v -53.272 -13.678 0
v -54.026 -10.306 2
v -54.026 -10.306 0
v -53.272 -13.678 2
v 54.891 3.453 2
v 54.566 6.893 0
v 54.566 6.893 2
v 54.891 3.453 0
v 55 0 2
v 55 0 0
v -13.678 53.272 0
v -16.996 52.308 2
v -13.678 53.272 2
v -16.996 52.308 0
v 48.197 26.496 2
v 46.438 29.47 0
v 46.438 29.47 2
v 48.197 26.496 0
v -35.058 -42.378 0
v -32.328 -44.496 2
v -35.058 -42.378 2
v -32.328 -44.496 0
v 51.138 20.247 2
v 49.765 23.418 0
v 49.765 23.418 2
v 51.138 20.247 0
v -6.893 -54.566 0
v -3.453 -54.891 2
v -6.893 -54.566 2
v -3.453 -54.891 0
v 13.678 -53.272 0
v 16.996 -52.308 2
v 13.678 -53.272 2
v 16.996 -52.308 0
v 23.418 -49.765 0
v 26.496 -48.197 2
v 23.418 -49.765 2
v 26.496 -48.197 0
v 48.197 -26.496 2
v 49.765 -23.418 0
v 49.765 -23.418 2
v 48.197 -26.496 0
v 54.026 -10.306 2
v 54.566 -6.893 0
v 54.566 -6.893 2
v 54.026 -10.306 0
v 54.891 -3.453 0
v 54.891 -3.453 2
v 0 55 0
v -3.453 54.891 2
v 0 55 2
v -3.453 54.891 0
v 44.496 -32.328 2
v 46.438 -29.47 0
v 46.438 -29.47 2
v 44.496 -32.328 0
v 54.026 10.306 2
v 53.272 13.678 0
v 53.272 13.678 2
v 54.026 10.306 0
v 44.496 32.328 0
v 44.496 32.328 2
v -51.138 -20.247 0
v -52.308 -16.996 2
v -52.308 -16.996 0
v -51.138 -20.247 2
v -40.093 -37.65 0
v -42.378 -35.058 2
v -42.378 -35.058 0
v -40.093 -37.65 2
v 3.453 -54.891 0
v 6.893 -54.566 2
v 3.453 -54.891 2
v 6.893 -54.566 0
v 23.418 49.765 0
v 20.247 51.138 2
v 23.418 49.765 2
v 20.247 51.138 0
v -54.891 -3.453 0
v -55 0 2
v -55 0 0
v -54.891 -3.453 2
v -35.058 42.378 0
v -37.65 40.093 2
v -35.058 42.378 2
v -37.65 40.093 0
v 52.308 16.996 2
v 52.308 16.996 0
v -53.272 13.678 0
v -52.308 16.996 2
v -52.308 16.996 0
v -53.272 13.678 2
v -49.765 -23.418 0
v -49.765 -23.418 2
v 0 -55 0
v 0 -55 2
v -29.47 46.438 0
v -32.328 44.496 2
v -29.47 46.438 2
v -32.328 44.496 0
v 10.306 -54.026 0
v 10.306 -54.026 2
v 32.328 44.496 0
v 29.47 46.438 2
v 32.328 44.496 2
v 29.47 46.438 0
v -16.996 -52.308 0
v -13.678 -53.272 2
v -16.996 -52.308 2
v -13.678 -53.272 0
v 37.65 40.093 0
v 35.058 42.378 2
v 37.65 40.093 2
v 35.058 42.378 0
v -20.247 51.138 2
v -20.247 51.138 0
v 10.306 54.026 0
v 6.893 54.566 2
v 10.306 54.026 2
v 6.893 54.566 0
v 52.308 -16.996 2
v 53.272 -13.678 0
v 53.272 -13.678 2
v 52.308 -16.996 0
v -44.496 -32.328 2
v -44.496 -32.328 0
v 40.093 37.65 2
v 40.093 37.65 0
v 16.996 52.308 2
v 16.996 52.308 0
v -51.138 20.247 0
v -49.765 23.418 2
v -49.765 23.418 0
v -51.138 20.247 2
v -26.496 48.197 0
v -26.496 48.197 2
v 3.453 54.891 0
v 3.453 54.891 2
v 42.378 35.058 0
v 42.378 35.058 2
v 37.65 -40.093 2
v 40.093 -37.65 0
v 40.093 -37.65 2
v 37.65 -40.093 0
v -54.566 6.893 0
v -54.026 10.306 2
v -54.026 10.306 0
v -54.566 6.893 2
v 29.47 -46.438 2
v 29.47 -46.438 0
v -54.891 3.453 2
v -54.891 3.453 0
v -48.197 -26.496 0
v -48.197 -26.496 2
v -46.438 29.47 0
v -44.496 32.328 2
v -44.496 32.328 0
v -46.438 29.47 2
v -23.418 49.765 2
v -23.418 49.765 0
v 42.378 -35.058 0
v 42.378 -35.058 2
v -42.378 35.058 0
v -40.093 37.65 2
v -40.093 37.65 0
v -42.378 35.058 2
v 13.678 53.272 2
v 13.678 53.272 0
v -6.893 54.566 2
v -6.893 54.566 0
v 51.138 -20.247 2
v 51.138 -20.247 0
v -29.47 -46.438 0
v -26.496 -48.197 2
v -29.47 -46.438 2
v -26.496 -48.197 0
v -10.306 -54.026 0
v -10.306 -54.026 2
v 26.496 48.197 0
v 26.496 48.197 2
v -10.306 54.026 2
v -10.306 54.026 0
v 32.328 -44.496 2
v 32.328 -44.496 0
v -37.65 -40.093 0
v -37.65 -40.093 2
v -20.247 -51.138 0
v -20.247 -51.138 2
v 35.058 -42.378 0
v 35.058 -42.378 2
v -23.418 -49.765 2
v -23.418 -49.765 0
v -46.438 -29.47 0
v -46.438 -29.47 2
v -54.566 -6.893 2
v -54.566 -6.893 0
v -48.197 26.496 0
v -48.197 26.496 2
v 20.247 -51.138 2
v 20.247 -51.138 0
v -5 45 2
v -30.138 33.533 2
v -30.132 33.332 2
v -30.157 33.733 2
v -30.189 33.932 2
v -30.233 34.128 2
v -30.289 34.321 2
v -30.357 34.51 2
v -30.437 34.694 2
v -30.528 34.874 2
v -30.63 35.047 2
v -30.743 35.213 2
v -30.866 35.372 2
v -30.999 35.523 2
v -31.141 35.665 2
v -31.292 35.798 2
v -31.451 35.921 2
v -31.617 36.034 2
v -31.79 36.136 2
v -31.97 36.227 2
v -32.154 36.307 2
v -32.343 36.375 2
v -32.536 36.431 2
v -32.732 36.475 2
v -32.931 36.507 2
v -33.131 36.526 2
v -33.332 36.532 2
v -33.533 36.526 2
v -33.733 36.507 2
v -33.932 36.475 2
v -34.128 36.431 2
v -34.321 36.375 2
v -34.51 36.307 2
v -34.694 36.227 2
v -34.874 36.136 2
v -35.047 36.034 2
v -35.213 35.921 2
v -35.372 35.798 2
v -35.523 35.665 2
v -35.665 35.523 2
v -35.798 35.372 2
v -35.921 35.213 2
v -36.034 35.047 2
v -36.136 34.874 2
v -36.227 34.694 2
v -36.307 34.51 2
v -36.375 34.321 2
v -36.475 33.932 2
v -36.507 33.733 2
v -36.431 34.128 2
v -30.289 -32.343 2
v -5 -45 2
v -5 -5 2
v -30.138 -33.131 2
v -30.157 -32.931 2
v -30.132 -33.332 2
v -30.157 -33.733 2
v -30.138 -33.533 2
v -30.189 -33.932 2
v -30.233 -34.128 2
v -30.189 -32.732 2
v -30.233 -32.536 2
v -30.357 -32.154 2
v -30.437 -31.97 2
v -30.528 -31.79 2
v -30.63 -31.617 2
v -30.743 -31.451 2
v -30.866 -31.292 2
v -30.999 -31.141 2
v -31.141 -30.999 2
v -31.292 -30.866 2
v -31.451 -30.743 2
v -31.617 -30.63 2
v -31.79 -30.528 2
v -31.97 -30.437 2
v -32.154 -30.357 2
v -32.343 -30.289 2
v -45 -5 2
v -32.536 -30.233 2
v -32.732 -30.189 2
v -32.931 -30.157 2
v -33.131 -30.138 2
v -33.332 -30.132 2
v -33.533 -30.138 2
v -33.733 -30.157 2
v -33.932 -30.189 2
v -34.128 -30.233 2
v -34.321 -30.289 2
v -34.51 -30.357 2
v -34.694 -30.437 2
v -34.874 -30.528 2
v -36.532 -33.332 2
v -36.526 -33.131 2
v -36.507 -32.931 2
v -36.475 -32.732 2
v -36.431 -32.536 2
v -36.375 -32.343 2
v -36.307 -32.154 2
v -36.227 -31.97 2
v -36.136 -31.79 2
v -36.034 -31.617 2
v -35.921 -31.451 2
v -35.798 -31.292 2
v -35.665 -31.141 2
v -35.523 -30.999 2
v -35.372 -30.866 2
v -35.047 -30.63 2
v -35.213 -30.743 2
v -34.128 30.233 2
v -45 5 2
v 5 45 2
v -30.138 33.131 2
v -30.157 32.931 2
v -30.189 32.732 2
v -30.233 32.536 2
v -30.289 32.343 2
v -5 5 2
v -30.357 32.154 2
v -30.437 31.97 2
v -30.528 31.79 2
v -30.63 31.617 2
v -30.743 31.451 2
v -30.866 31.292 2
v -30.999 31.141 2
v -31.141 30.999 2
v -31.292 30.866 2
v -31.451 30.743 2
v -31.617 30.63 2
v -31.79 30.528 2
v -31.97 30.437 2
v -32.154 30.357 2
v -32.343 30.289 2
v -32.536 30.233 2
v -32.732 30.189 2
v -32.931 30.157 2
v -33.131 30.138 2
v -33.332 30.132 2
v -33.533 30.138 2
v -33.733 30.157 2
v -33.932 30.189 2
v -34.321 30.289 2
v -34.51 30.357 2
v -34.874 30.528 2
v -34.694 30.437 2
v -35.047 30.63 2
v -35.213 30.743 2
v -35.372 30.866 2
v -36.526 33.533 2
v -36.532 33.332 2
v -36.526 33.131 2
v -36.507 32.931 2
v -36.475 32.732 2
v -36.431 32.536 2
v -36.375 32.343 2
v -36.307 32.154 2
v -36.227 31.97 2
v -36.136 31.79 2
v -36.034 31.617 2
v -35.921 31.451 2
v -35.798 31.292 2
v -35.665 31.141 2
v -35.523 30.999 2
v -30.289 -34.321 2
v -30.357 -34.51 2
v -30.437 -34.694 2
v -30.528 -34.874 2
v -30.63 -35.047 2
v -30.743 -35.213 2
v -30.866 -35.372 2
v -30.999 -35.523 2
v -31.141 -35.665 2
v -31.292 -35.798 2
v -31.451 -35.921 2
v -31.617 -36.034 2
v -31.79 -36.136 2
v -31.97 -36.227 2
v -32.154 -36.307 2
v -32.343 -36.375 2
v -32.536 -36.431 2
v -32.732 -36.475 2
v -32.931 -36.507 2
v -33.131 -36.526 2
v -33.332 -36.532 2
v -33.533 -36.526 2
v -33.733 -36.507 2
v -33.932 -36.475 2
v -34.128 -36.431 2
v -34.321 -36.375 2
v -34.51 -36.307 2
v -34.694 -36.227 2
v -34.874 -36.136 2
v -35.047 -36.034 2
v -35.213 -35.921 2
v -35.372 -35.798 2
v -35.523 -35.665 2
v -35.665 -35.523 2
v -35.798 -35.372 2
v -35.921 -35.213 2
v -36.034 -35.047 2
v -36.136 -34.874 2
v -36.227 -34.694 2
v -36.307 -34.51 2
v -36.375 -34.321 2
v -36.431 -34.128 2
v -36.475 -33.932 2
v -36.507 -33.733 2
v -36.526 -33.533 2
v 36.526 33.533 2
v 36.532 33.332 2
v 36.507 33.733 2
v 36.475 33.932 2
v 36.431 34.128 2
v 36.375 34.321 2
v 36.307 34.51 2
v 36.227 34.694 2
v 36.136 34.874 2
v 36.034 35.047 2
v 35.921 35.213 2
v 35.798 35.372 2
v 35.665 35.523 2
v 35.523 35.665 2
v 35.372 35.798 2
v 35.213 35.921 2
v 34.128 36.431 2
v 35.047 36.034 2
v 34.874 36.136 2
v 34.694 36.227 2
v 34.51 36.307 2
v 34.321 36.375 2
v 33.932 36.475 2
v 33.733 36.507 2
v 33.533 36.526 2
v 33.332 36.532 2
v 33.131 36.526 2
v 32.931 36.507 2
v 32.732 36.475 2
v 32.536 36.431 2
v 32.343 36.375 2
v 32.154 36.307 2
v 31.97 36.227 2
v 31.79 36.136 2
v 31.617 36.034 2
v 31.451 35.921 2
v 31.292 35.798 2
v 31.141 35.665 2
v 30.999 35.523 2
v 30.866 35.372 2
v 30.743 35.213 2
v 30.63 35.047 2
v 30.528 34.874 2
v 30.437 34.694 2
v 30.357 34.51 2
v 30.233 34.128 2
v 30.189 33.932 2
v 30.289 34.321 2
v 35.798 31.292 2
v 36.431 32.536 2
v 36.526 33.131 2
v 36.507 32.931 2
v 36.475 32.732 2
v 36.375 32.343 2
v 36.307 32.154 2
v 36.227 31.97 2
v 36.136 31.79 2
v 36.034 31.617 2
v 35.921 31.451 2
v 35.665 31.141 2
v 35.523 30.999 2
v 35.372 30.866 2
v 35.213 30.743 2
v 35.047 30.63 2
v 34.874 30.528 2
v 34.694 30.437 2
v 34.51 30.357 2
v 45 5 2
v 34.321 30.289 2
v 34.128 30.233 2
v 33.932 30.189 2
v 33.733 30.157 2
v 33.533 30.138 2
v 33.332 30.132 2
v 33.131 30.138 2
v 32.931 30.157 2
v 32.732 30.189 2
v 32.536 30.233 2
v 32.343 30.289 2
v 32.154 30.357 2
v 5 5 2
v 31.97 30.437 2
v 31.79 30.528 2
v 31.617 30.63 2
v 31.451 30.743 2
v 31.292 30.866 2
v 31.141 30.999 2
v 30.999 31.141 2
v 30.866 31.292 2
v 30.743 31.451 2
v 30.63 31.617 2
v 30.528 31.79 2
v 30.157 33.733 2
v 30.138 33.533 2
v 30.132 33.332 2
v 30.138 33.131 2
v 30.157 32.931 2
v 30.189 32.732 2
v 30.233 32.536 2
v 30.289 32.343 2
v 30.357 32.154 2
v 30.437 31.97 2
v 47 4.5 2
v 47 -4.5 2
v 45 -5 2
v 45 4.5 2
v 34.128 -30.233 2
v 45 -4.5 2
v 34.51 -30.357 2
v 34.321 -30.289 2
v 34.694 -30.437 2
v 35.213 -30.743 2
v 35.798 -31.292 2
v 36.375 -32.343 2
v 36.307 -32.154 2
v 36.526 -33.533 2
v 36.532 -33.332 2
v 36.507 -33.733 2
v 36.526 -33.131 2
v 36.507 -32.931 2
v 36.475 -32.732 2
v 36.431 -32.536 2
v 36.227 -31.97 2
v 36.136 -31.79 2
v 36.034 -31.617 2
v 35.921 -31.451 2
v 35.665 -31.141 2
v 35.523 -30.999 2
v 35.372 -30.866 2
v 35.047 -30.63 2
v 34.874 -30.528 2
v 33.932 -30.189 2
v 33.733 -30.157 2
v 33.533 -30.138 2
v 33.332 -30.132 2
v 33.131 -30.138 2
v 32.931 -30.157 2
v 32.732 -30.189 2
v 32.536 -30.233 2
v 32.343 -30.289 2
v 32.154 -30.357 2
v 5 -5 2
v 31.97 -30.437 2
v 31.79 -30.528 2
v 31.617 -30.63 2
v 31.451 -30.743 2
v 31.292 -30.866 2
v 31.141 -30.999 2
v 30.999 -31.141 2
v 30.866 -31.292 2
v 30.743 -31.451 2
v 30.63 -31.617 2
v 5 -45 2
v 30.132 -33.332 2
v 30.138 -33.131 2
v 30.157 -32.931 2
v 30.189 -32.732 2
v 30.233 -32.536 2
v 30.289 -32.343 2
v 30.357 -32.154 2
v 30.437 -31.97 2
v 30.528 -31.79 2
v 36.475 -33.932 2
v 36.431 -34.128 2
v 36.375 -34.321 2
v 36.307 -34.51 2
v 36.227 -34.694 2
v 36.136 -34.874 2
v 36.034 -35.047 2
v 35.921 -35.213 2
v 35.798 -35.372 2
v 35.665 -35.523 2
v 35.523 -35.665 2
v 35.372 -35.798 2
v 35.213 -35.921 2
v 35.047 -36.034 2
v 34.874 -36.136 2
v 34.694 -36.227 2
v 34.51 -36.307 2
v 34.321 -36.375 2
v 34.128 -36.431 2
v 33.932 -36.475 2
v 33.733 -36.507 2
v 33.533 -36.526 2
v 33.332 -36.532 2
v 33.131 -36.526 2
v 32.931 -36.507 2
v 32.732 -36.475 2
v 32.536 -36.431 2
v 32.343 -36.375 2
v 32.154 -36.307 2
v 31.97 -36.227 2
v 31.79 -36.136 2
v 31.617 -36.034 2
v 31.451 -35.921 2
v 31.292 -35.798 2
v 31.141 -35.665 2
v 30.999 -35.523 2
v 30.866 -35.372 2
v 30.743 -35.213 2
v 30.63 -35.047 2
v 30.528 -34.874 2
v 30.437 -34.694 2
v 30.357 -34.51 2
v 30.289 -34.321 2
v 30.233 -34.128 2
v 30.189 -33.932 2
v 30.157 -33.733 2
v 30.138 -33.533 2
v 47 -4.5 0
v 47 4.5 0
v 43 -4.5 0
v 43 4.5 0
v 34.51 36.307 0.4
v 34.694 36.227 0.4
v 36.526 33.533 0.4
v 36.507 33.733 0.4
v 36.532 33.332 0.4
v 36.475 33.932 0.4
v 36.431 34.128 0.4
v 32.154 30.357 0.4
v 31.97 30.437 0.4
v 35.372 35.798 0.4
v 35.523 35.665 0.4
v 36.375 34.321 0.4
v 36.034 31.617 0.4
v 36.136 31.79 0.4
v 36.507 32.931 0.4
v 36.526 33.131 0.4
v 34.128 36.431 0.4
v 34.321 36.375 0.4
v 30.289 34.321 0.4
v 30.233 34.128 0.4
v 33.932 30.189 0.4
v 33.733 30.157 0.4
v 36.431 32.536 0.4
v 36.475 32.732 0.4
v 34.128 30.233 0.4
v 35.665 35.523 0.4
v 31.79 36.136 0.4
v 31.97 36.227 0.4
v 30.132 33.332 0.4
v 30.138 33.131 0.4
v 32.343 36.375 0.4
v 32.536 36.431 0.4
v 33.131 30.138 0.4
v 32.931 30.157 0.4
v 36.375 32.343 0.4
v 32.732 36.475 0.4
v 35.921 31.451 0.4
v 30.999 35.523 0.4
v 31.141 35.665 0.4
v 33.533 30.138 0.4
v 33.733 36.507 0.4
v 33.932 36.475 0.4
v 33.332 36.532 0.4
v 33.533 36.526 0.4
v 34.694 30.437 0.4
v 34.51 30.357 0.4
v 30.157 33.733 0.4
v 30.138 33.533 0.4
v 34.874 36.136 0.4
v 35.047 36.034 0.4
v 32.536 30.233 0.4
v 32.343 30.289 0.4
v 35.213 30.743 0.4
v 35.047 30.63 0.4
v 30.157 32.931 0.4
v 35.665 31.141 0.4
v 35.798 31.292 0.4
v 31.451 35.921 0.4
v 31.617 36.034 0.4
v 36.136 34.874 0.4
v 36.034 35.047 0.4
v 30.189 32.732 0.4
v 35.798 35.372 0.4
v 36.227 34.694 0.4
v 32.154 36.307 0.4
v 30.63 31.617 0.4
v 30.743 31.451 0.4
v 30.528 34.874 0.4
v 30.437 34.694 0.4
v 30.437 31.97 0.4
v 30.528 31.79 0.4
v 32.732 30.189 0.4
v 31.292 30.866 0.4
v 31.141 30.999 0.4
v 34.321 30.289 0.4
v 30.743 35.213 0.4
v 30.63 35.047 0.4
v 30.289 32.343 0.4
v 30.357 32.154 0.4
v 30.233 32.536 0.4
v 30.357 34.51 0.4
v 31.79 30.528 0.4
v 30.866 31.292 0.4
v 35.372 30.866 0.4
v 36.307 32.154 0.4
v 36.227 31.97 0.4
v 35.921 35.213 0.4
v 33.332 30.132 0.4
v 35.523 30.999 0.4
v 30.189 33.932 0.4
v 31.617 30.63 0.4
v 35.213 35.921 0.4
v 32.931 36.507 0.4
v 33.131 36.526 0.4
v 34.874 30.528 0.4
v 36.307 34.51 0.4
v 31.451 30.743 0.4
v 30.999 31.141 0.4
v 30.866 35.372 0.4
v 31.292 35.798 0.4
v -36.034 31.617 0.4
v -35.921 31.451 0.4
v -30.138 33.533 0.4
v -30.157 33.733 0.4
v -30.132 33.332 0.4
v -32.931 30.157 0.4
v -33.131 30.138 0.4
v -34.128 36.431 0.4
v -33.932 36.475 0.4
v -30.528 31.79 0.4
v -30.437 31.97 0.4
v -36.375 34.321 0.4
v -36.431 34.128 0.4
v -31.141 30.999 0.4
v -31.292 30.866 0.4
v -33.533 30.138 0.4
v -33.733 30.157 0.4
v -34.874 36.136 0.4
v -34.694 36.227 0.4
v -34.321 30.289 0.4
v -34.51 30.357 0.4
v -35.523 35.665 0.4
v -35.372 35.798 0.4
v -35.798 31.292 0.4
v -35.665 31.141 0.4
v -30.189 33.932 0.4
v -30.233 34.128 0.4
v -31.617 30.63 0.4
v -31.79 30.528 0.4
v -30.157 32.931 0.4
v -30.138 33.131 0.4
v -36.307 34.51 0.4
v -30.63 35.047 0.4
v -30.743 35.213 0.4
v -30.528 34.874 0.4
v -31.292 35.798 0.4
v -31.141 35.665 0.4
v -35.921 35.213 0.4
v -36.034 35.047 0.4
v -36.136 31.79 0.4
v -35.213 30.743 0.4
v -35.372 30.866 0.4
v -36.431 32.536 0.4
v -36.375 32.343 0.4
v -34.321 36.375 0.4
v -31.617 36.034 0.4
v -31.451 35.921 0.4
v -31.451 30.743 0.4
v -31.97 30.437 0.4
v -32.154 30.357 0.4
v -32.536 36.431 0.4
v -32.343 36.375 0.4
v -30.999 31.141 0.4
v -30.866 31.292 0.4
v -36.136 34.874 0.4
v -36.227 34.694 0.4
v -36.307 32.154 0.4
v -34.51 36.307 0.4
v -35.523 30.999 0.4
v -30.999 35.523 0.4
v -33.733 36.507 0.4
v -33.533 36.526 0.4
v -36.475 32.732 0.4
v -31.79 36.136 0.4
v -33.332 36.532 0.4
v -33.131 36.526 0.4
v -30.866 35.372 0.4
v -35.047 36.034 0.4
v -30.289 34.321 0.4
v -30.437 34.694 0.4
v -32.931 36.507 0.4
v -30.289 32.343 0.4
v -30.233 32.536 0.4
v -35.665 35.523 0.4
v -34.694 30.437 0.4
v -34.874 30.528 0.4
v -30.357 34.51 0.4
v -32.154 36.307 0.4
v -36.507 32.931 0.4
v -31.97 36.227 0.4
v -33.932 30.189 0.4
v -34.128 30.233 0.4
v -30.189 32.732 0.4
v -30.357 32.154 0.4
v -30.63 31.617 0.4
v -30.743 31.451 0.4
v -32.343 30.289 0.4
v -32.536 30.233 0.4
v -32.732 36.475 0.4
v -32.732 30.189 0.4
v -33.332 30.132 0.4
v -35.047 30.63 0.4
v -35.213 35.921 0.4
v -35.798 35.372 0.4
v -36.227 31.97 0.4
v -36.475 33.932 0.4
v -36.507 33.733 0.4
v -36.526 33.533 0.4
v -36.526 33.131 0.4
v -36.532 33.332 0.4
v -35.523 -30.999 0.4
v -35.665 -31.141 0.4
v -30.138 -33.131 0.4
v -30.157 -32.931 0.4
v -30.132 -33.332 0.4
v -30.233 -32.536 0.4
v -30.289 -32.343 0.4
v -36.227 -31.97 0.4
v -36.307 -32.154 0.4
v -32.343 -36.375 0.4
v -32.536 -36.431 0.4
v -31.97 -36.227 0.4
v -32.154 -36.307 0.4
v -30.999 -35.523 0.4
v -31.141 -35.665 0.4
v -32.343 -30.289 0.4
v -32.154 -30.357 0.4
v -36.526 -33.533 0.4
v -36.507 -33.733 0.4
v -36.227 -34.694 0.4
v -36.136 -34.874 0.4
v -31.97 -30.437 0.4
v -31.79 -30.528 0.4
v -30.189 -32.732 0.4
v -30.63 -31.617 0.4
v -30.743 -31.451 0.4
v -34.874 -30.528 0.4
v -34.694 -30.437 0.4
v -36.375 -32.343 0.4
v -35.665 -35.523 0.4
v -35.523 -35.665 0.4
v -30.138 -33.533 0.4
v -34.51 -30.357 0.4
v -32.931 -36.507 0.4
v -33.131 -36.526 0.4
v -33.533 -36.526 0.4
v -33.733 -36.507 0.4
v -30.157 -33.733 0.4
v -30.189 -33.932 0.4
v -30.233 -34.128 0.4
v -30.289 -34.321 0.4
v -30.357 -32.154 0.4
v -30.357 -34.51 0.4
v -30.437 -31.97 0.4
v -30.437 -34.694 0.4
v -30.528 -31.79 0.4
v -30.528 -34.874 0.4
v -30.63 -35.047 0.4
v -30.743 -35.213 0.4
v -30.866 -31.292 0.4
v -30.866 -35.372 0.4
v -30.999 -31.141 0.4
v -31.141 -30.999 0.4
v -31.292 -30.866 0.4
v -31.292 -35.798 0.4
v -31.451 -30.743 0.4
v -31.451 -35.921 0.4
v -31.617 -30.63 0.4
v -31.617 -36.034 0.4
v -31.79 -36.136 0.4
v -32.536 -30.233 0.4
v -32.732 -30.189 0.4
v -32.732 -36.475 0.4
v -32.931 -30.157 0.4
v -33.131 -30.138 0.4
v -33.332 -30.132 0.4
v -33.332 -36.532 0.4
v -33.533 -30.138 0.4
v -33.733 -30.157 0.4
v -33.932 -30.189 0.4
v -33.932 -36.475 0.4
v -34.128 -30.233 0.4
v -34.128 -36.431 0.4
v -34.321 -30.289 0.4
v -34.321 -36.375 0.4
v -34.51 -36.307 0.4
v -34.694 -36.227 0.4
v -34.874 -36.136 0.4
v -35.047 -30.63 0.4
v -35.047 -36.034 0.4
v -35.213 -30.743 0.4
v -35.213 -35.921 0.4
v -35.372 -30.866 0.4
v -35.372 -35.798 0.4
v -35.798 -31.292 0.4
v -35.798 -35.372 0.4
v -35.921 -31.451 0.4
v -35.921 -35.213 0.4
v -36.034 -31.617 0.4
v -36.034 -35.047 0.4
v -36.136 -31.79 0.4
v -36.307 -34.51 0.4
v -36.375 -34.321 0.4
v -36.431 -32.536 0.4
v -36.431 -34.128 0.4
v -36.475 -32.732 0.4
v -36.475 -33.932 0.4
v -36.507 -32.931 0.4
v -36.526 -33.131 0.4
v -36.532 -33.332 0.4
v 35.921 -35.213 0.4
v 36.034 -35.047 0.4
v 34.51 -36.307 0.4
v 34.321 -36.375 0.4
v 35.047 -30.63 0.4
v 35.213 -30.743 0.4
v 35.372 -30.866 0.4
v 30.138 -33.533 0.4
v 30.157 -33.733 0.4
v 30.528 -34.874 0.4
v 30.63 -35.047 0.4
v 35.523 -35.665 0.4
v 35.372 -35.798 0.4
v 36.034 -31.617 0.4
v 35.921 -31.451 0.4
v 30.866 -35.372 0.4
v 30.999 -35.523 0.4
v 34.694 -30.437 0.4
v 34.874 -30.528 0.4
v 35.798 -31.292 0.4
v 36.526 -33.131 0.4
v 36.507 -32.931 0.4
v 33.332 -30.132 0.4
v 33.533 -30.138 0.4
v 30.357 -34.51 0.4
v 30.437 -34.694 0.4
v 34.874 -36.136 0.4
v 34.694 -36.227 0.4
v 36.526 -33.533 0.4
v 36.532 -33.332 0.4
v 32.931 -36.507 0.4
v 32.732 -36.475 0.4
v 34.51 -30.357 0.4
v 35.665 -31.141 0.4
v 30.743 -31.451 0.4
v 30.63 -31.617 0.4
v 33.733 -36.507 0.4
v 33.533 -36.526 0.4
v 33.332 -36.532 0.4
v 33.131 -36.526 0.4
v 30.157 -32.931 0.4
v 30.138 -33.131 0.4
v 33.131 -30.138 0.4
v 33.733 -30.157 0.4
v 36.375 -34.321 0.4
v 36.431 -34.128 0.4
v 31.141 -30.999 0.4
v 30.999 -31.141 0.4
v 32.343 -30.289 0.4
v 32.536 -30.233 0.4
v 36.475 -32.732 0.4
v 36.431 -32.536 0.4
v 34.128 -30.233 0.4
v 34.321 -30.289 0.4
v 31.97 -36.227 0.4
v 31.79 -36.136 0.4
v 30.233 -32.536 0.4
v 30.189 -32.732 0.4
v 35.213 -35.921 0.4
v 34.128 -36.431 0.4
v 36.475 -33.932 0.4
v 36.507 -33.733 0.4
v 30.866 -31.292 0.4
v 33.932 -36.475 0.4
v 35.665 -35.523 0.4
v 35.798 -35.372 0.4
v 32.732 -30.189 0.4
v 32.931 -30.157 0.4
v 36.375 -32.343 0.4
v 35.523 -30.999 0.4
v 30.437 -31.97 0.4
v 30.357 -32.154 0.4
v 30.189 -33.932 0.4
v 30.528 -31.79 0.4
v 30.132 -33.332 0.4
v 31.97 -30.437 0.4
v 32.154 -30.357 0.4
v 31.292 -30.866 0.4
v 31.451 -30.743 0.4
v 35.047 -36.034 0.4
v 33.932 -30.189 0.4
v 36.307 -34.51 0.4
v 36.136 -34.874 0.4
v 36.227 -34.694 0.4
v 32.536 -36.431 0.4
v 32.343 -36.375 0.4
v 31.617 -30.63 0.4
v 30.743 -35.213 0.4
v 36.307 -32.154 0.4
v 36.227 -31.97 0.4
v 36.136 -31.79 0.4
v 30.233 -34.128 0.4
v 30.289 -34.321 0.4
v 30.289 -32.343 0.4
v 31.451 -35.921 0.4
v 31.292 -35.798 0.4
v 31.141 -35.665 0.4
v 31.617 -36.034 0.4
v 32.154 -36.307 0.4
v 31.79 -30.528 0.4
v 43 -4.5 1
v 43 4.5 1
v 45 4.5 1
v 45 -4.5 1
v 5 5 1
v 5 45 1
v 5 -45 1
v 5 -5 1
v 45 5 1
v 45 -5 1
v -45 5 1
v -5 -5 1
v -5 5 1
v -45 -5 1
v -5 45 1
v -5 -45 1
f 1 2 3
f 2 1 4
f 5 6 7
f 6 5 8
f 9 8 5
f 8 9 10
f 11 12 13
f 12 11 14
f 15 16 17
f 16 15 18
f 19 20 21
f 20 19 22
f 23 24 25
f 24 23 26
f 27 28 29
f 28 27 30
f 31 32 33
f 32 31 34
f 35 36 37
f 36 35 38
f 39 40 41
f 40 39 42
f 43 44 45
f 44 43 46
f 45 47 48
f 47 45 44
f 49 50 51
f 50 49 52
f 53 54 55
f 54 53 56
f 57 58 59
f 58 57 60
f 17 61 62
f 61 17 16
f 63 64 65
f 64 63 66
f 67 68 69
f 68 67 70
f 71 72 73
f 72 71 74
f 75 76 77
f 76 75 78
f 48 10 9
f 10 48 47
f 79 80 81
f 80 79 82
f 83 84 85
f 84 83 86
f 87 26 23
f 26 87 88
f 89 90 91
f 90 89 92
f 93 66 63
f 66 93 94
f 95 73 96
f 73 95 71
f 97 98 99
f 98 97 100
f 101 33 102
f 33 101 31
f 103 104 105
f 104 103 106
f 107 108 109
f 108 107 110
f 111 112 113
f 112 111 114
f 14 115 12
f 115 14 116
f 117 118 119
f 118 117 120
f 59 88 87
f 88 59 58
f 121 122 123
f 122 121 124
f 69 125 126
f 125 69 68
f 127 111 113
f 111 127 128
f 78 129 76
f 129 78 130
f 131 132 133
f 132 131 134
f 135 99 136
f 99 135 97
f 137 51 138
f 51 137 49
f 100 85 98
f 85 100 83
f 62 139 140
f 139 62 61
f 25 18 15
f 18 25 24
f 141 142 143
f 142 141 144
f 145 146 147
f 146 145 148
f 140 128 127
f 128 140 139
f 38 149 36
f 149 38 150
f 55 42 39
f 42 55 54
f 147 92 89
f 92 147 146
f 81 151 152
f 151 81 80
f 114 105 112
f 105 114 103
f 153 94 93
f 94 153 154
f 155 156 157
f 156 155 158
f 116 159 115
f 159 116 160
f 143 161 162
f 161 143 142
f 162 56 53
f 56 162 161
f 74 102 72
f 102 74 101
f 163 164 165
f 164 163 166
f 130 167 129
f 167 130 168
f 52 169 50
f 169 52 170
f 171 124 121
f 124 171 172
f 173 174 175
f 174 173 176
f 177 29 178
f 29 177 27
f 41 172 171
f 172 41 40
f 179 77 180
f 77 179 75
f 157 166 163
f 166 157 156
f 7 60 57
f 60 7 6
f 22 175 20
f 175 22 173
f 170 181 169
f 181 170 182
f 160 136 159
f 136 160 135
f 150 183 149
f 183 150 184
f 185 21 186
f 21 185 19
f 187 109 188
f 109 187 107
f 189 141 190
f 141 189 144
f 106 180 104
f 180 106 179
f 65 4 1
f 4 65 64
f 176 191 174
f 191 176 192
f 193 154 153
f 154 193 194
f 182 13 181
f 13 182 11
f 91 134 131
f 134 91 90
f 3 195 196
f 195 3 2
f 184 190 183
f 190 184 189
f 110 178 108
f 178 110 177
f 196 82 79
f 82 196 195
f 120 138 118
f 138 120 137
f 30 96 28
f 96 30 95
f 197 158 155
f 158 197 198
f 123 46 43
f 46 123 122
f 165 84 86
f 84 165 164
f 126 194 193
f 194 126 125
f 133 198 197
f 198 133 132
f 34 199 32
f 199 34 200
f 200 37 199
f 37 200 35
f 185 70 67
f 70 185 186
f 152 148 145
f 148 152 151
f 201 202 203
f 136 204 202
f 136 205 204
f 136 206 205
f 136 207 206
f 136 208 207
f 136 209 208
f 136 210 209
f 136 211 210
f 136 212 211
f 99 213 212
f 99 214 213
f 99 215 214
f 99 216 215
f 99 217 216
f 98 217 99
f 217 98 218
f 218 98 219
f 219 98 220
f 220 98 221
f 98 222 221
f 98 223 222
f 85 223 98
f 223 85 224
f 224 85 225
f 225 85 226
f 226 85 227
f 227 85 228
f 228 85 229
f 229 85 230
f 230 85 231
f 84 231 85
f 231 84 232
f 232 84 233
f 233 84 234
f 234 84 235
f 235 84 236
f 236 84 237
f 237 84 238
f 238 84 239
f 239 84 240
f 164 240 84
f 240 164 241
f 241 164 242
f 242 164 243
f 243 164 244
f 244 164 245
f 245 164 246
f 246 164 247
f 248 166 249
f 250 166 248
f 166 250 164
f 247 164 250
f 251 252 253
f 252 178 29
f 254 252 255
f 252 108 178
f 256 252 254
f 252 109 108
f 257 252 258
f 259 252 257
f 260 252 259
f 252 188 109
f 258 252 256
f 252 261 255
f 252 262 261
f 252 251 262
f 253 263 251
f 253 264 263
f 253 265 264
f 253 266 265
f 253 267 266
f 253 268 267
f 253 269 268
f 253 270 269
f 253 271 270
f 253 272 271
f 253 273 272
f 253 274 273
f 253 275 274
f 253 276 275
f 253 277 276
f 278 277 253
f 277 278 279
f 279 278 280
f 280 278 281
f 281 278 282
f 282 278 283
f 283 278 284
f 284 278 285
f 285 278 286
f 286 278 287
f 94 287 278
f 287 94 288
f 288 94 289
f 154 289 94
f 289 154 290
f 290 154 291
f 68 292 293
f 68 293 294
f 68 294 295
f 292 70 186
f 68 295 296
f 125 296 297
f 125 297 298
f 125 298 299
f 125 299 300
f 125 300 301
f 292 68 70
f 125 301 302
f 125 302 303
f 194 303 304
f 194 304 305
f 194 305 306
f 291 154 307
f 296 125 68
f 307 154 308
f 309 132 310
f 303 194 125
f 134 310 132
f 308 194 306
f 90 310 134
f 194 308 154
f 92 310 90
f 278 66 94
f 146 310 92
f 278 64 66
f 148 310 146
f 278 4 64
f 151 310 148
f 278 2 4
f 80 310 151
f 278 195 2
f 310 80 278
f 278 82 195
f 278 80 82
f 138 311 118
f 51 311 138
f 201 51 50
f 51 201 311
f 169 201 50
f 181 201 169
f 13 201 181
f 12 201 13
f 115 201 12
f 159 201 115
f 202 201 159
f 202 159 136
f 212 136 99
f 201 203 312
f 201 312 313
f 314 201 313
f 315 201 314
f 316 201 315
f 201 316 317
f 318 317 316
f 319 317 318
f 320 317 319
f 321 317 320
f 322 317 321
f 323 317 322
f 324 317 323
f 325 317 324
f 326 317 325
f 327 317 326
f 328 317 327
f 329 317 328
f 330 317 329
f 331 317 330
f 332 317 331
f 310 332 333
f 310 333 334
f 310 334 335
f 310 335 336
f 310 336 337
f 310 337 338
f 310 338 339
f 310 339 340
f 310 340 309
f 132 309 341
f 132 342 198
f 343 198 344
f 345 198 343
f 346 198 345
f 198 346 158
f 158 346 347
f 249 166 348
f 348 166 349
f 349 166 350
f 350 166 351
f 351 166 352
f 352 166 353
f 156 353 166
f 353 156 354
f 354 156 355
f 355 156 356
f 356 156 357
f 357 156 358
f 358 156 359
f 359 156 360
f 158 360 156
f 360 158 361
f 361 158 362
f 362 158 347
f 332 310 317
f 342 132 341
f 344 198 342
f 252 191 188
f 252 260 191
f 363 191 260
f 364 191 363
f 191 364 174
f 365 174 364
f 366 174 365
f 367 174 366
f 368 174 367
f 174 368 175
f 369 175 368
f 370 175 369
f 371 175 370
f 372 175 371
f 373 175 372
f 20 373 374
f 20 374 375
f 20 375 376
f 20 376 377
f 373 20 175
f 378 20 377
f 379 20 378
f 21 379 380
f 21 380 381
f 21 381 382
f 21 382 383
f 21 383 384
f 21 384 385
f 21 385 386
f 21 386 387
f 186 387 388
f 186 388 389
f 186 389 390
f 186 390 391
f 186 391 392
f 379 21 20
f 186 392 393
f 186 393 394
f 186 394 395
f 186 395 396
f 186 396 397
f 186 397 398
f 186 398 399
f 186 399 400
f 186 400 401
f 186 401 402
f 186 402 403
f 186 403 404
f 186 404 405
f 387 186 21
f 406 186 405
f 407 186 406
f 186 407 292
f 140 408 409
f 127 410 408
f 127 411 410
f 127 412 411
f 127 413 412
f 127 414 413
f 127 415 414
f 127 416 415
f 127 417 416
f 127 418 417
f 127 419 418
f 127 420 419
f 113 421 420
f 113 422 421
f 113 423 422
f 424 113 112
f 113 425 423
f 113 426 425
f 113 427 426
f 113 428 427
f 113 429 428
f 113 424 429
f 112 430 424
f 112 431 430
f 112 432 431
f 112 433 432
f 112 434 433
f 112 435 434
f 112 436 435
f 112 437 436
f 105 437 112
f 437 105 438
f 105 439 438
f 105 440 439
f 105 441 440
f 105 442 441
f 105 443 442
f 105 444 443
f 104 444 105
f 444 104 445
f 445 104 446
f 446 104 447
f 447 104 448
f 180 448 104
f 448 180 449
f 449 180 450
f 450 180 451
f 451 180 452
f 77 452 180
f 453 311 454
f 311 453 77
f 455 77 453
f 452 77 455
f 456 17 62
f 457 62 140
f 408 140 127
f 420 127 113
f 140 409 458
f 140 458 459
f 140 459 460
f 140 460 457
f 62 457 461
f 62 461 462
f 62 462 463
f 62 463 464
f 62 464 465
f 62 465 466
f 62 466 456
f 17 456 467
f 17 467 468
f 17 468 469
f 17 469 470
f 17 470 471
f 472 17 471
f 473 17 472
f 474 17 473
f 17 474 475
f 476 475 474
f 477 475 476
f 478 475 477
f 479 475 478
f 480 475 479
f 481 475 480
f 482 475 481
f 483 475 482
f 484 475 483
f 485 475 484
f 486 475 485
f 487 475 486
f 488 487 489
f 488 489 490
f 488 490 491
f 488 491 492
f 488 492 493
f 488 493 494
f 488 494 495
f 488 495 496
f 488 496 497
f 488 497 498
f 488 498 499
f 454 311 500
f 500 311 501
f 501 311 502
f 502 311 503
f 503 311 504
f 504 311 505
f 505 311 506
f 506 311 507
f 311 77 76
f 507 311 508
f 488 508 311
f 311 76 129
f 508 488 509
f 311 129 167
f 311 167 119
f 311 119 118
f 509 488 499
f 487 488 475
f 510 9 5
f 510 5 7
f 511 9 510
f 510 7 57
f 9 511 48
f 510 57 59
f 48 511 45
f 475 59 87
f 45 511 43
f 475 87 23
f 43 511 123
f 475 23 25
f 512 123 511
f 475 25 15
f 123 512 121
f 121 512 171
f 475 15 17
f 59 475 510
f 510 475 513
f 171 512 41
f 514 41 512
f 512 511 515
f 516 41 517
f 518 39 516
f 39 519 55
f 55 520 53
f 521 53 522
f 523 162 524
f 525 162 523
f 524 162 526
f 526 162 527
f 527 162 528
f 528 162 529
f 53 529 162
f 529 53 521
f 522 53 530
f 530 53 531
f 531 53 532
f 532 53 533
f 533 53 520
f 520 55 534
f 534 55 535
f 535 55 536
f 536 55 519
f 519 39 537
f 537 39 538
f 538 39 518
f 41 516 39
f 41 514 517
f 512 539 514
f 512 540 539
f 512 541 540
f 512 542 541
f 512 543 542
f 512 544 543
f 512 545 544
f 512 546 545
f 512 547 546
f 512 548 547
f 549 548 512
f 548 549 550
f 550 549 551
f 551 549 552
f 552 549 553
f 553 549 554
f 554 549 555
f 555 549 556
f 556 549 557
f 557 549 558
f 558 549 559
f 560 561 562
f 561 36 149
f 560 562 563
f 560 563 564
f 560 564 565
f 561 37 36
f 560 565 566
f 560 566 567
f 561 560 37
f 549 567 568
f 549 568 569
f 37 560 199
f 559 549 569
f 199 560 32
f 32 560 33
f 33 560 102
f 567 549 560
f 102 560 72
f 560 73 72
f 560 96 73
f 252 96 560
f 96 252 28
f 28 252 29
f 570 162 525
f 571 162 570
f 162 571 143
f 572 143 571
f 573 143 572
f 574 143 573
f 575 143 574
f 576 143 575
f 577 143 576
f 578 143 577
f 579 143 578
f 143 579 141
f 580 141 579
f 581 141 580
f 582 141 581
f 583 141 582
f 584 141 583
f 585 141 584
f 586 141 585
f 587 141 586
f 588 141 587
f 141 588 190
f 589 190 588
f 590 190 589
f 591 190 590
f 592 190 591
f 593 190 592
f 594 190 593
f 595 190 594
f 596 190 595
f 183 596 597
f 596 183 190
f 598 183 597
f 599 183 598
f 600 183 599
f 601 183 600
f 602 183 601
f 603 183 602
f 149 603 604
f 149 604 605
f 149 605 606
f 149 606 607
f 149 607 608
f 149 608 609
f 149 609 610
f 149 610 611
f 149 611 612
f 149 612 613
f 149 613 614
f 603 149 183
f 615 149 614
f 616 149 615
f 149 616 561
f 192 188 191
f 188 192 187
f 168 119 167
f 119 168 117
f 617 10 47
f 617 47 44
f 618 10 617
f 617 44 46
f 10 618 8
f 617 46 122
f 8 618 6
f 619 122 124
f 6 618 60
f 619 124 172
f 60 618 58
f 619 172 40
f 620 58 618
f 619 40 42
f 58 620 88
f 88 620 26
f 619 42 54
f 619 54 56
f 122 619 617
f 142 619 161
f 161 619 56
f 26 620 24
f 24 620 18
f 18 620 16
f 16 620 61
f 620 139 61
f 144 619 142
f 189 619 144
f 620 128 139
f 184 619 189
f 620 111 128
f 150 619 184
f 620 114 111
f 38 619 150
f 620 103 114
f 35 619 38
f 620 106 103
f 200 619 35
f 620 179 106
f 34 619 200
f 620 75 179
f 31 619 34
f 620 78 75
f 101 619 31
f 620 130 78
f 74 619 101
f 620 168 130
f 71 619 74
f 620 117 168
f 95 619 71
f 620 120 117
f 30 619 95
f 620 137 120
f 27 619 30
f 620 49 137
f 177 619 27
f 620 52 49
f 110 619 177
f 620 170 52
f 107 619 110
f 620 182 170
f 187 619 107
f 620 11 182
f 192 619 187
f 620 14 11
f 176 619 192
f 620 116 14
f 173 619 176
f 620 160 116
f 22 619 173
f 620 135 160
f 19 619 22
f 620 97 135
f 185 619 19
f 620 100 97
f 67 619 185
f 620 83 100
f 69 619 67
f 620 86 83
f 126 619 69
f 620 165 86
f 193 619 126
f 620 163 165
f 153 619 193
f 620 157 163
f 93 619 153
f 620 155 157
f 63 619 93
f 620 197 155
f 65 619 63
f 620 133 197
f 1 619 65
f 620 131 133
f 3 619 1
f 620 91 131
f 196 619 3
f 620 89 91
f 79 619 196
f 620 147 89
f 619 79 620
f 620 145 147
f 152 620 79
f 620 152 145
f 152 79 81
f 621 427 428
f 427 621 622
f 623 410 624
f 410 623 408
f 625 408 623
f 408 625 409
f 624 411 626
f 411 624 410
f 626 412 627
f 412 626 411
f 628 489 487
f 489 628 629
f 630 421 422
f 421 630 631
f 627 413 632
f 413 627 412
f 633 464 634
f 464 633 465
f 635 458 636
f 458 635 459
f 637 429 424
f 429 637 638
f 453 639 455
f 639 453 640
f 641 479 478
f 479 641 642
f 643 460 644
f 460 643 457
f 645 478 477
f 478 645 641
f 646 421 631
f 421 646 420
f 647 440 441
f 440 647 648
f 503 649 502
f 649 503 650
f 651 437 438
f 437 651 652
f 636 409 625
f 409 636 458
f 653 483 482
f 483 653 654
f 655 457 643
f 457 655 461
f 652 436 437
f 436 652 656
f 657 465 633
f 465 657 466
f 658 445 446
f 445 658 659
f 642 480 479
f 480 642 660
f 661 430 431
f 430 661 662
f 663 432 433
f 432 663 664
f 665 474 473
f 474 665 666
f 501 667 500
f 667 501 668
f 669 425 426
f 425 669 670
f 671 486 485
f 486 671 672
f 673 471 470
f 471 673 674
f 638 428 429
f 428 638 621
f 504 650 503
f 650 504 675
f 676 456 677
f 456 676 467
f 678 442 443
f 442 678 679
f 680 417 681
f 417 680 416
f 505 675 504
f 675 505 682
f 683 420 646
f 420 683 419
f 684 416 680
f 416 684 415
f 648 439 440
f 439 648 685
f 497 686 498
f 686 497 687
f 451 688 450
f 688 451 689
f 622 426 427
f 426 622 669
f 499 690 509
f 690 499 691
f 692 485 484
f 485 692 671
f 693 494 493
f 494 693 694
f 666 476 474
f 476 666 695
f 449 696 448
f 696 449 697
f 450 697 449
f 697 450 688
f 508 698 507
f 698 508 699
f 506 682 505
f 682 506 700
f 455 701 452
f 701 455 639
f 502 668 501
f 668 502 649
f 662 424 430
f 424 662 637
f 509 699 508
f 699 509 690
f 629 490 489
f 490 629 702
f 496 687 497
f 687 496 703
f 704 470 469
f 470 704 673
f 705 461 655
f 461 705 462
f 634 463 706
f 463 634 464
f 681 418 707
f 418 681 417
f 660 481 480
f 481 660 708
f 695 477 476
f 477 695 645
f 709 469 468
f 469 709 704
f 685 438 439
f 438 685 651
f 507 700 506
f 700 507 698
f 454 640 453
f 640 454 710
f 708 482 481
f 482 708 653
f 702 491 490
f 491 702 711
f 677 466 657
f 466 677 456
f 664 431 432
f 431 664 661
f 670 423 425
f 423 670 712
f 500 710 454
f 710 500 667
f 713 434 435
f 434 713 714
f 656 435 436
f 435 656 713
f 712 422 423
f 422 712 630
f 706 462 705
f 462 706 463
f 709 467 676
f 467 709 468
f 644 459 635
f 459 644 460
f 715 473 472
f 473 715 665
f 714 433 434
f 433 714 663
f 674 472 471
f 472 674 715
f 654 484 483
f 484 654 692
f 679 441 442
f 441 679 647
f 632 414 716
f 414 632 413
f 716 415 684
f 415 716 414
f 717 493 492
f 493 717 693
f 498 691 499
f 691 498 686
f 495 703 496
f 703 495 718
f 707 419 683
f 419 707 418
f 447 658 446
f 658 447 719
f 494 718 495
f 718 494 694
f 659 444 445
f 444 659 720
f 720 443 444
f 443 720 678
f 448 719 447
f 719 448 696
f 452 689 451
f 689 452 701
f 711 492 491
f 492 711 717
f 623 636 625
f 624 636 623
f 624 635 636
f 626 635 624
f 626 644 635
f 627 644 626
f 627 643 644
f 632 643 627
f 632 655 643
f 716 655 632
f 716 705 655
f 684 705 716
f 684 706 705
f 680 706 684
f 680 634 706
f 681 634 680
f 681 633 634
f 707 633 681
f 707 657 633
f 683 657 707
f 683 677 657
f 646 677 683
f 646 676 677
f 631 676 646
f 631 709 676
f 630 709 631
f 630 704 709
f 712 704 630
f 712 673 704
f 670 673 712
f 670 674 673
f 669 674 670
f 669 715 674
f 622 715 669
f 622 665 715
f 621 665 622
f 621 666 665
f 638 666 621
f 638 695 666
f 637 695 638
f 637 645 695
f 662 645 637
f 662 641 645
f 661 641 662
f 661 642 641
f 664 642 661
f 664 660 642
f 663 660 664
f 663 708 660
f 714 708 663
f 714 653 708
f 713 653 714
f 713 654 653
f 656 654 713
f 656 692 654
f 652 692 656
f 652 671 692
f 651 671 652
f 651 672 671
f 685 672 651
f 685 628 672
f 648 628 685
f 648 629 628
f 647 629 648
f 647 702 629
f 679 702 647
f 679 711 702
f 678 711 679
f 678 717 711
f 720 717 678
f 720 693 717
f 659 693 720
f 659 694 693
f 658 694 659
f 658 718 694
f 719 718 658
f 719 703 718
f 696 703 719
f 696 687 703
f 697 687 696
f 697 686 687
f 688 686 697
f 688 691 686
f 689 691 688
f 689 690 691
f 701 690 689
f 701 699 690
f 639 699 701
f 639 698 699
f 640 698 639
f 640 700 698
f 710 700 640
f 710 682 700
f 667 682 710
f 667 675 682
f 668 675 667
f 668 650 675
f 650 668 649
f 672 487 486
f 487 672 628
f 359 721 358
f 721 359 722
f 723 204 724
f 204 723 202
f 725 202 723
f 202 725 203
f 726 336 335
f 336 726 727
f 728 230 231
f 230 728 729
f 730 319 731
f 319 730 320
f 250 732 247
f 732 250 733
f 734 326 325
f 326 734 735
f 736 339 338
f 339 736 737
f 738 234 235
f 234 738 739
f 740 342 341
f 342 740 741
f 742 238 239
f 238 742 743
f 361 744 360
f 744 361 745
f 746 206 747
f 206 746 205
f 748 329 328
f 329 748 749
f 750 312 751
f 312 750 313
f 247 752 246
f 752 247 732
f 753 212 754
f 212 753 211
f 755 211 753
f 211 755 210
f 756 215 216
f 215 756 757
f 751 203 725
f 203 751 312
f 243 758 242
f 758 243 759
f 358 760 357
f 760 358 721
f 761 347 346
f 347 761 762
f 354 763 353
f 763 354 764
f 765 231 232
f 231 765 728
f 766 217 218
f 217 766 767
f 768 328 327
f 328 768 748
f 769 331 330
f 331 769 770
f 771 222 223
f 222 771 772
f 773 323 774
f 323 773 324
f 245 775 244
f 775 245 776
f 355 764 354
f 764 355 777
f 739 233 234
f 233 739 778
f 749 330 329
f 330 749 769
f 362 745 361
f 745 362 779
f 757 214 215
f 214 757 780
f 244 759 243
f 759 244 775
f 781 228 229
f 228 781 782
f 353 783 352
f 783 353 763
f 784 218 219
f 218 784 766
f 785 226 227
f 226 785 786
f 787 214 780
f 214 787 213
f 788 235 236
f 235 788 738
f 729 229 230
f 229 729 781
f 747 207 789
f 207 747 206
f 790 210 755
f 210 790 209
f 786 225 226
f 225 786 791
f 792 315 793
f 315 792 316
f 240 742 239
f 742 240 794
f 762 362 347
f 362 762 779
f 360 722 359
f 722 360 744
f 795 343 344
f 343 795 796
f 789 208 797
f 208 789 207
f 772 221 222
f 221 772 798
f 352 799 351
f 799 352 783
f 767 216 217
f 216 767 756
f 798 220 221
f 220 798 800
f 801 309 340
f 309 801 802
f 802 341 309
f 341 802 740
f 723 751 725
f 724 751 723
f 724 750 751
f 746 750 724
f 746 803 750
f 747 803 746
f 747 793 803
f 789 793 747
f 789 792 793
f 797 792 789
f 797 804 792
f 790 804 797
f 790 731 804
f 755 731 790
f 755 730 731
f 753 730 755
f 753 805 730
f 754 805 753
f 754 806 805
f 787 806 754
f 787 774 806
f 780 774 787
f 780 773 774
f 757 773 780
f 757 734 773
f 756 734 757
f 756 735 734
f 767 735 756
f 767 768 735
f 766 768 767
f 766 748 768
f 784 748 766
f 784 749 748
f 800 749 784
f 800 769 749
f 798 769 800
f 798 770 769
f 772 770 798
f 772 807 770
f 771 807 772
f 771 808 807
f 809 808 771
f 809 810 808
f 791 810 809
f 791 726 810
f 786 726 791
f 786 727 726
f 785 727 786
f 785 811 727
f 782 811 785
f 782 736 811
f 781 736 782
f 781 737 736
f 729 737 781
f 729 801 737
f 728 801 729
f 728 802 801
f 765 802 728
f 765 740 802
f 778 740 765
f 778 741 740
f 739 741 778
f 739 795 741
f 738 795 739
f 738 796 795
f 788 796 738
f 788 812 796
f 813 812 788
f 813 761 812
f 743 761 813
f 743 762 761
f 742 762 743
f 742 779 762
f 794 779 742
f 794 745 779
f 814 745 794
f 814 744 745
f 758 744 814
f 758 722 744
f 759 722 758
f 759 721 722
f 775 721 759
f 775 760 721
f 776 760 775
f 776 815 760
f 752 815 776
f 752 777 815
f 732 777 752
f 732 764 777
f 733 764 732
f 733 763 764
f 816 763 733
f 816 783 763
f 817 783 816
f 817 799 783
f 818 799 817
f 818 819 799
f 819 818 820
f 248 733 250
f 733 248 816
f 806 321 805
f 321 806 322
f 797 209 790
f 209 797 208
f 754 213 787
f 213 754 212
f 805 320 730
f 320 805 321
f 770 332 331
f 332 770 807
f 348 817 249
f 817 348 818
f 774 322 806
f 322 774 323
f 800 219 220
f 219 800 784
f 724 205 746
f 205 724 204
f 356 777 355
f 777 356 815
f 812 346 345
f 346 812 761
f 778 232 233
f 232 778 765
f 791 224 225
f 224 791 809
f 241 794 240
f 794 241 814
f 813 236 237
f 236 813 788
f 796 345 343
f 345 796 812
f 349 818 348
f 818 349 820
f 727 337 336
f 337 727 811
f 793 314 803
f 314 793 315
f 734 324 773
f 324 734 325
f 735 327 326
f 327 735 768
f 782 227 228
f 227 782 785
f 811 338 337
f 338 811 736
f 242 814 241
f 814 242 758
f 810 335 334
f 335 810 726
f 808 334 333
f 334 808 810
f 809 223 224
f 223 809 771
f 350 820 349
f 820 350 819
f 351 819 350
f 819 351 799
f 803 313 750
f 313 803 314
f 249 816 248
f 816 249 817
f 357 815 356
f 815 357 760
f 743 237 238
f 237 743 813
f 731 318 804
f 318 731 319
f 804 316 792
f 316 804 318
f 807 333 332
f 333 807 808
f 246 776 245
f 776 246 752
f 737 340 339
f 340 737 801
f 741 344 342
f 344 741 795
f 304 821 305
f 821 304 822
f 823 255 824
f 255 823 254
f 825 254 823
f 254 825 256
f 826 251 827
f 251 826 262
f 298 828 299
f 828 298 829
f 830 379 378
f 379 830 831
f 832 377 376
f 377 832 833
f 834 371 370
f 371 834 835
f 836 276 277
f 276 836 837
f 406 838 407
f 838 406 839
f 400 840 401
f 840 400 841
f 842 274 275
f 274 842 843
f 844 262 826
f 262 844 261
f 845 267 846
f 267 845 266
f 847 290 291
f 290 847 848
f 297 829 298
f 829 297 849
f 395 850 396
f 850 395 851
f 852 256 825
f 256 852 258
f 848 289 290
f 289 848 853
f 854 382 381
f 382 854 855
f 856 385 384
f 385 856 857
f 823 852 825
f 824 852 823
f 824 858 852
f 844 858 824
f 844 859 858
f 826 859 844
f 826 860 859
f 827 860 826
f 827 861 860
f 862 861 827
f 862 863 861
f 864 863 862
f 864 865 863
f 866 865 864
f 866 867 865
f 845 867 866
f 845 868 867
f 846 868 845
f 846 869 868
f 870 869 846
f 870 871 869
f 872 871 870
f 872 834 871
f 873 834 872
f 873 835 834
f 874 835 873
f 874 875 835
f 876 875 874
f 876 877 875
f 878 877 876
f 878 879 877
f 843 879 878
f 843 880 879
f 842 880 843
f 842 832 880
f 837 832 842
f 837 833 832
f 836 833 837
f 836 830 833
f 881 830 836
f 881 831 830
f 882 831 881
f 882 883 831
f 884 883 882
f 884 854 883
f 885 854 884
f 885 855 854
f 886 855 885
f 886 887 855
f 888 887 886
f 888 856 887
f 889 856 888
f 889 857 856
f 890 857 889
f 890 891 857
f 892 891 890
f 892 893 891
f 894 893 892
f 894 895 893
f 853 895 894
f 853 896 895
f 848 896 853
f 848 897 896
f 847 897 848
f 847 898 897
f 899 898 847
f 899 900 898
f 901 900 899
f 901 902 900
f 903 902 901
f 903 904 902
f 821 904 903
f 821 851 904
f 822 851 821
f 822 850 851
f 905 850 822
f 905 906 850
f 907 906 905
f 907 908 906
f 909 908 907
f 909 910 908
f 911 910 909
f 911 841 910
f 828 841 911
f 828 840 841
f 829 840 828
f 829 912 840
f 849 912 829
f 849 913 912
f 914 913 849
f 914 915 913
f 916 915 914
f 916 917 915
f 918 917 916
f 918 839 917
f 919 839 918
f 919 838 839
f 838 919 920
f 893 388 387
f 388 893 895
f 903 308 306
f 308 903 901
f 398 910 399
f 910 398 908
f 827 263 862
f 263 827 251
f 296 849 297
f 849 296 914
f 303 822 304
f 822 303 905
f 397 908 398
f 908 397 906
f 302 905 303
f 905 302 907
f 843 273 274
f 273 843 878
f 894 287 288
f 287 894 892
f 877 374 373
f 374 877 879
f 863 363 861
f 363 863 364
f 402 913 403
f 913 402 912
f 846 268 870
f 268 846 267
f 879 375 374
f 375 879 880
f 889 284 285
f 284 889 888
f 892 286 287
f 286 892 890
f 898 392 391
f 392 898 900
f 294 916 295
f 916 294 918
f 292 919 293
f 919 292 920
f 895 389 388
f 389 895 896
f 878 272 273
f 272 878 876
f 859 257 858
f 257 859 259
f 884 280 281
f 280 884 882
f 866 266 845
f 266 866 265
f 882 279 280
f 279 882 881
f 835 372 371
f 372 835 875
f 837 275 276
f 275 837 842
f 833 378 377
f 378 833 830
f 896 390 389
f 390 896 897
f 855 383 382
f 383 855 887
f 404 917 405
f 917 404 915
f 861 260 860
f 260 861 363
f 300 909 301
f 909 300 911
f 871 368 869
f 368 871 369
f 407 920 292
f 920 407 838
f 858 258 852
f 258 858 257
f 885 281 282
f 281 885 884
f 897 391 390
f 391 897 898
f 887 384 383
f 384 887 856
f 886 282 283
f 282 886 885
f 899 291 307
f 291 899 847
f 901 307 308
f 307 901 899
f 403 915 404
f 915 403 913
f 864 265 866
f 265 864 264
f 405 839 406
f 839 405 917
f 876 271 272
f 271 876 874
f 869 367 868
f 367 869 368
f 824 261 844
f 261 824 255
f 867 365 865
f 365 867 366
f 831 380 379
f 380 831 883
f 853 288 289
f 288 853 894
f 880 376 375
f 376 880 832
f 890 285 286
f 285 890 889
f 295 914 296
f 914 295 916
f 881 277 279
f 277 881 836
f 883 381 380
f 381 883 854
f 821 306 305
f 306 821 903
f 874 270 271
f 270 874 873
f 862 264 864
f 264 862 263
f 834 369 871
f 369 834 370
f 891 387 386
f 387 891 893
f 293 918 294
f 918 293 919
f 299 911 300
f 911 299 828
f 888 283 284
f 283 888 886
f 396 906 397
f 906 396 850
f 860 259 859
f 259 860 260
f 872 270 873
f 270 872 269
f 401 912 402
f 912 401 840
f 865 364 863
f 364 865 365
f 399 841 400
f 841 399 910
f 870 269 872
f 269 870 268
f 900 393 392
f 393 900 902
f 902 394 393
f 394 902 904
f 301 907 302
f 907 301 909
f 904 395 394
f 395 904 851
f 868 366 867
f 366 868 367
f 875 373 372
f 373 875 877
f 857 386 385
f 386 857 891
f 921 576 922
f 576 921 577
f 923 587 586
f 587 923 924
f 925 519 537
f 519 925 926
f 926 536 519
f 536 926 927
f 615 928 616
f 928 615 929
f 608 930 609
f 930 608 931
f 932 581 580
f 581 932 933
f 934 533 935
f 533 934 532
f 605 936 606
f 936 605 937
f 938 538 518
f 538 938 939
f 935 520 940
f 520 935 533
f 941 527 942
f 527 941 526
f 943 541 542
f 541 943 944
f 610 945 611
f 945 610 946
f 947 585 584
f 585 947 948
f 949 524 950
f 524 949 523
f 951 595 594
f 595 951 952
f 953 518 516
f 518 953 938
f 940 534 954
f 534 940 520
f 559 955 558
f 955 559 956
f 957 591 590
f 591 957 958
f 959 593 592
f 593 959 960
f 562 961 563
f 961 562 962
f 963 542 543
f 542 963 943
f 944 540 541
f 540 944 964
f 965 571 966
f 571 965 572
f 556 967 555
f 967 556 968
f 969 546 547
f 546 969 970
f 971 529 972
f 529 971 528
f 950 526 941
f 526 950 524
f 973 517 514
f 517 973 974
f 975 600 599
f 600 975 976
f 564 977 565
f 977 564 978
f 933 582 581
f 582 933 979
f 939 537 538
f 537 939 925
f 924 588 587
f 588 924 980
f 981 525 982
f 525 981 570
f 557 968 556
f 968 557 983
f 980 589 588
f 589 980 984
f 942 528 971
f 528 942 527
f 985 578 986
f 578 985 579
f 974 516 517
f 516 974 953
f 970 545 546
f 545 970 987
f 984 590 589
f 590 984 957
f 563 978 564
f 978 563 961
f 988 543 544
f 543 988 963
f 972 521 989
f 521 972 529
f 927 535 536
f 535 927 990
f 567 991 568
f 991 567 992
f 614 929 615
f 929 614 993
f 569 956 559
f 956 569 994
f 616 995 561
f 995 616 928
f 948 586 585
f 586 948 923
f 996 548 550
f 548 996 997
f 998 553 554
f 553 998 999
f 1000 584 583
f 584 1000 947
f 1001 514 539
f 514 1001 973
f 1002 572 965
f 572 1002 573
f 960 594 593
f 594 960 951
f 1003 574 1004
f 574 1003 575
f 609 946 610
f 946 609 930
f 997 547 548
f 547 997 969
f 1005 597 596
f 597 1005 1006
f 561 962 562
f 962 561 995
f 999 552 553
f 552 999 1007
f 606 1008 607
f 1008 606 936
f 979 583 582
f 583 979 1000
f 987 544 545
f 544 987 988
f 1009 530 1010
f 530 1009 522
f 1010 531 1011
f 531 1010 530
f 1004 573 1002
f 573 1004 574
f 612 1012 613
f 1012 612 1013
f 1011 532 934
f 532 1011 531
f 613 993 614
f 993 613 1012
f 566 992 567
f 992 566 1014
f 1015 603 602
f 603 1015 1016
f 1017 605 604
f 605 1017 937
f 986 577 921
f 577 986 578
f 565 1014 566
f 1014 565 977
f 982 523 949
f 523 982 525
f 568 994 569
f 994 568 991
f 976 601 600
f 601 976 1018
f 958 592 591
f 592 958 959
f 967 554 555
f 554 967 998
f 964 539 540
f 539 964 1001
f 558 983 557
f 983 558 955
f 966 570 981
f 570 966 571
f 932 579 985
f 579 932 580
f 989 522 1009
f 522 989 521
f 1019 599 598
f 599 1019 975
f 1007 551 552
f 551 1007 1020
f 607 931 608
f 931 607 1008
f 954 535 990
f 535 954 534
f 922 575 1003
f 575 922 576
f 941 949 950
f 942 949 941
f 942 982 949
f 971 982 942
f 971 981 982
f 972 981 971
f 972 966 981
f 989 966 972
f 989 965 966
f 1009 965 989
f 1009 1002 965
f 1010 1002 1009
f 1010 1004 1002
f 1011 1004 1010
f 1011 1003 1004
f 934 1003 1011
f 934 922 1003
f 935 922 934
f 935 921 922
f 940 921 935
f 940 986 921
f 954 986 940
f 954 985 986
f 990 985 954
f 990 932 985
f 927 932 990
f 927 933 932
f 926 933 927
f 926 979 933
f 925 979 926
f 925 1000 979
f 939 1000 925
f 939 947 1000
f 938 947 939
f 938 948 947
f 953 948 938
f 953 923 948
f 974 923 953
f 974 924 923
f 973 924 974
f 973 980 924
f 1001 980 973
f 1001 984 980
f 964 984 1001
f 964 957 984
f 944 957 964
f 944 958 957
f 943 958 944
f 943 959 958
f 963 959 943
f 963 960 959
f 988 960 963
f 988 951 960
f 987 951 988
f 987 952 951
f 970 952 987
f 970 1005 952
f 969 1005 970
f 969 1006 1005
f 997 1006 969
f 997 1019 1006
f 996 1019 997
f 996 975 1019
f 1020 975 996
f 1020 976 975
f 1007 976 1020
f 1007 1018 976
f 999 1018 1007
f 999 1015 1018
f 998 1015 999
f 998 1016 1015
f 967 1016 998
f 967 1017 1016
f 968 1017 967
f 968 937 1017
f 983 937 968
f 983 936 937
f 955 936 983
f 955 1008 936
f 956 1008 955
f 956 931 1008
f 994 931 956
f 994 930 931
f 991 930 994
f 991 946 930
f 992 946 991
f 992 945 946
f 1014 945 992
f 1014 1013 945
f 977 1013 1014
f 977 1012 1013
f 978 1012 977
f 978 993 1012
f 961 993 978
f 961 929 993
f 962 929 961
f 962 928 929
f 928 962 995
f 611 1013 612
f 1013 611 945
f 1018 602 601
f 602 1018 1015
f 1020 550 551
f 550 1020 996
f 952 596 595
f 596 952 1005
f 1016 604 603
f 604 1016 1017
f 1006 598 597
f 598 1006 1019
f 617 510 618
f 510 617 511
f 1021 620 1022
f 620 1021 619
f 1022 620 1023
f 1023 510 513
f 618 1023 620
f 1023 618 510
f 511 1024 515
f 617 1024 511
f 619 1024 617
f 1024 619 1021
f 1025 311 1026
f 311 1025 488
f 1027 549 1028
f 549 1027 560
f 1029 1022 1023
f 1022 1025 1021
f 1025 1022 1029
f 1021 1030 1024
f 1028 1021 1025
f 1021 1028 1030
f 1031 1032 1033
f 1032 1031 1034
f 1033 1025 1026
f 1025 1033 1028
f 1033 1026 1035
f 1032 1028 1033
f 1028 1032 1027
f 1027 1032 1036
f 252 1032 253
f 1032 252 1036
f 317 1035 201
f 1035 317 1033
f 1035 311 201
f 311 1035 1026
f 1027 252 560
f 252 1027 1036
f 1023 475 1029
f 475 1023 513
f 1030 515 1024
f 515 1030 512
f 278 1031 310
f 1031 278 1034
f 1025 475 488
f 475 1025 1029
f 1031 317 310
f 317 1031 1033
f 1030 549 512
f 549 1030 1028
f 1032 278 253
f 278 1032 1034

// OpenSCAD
$fn=100;
hr=2.5;
ledSPace=16.666;
magr = 6.4/2;
module heartFront() {
  difference () {
    cylinder(r=55,h=3);
    translate([0,0,-0.1]) cylinder(r=hr, h=10.2);
    translate([ledSPace,0,-0.1]) cylinder(r=hr, h=10.2);
    translate([ledSPace*2,0,-0.1]) cylinder(r=hr, h=10.2);
    translate([-ledSPace,0,-0.1]) cylinder(r=hr, h=10.2);
    translate([-ledSPace*2,0,-0.1]) cylinder(r=hr, h=10.2);
    translate([0,ledSPace,-0.1]) cylinder(r=hr, h=10.2);
    translate([0,ledSPace*2,-0.1]) cylinder(r=hr, h=10.2);
    translate([0,-ledSPace,-0.1]) cylinder(r=hr, h=10.2);
    translate([0,-ledSPace*2,-0.1]) cylinder(r=hr, h=10.2);
    translate([0,0,3]) cube([10,90,4],center=true);
    translate([0,0,3]) cube([90,10,4],center=true);
    translate([ledSPace*2,ledSPace*2,1]) cylinder(r=magr, h=3);
    translate([-ledSPace*2,ledSPace*2,1]) cylinder(r=magr, h=3);
    translate([-ledSPace*2,-ledSPace*2,1]) cylinder(r=magr, h=3);
    translate([ledSPace*2,-ledSPace*2,1]) cylinder(r=magr, h=3);
    
  }
}

module heartBack() {
  difference () {
    cylinder(r=55,h=2);
    translate([ledSPace*2,ledSPace*2,0.4]) cylinder(r=magr, h=3);
    translate([-ledSPace*2,ledSPace*2,0.4]) cylinder(r=magr, h=3);
    translate([-ledSPace*2,-ledSPace*2,0.4]) cylinder(r=magr, h=3);
    translate([ledSPace*2,-ledSPace*2,0.4]) cylinder(r=magr, h=3);
    //translate([45,0,-0.1]) cylinder(r=2,h=2.2);
    translate([45,0,0.75]) cube([4,9,4],center=true);;
    translate([0,0,3]) cube([10,90,4],center=true);
    translate([0,0,3]) cube([90,10,4],center=true);
  }
}




//heartFront();
heartBack();
